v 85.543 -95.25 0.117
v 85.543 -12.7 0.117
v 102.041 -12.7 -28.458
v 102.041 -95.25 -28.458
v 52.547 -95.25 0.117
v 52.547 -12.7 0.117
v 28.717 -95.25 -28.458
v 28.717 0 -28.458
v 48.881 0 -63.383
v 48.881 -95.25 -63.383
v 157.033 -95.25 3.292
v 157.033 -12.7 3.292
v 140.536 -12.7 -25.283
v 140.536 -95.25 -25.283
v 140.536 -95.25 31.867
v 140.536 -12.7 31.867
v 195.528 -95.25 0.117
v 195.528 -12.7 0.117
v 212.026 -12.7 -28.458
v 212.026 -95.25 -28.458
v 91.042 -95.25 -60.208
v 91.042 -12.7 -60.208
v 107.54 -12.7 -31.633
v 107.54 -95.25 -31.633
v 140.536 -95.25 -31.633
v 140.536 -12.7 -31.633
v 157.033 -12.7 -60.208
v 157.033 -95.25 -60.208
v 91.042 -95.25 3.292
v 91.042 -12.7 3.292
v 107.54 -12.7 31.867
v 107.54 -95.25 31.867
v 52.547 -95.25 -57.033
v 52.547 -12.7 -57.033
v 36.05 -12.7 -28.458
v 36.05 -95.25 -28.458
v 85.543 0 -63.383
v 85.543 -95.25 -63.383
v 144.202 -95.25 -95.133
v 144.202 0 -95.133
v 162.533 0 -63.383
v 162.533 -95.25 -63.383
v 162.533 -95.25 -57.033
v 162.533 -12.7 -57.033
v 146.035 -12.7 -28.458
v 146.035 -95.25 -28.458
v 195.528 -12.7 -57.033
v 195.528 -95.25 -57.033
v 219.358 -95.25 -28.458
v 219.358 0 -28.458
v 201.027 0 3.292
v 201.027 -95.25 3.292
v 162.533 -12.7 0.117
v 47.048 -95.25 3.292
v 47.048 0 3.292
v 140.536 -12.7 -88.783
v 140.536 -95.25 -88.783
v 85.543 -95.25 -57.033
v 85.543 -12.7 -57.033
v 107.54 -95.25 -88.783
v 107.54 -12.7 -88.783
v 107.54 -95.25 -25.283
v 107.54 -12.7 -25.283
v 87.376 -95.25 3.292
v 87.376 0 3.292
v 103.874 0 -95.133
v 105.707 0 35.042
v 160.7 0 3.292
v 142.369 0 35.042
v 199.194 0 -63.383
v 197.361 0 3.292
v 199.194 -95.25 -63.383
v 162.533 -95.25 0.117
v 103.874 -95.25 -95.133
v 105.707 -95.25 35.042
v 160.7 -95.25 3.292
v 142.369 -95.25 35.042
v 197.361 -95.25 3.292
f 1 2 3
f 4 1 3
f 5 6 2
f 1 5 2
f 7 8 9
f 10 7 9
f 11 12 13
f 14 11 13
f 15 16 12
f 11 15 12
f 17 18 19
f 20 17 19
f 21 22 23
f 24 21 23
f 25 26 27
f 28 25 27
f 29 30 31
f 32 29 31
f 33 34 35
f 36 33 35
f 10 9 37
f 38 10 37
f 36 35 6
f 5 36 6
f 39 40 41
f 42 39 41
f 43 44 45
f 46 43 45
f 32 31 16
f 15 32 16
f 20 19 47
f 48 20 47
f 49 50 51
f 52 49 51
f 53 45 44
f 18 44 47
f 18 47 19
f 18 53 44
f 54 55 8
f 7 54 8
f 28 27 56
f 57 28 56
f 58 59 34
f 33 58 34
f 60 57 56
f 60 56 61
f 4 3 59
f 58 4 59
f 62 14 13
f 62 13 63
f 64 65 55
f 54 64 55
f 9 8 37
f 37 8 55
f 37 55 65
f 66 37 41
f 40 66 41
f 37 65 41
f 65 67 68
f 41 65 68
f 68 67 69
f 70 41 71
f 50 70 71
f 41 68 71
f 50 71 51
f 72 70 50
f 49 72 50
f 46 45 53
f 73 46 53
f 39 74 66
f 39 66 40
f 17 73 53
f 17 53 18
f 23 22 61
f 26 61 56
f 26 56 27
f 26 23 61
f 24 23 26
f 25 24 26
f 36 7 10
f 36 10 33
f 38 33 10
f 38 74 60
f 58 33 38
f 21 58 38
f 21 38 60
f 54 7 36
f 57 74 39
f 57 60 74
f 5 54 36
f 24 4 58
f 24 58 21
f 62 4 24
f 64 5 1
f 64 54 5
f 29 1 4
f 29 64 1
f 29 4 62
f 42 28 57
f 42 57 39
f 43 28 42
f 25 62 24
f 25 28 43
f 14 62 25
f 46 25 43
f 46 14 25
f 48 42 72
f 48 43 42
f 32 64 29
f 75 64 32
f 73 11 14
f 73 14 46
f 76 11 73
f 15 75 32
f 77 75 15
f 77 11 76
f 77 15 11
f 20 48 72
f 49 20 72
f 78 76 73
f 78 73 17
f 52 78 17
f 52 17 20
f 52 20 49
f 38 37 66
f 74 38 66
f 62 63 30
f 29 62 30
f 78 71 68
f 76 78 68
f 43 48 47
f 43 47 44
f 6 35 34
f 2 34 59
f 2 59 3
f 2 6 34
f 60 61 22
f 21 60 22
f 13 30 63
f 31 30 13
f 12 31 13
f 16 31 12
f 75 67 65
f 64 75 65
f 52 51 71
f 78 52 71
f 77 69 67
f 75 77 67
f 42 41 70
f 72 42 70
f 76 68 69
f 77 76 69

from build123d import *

# Parameters (mm, degrees)
F1_DEPTH = 12.7
F2_DEPTH = 95.25


# Not quite as in the source:
# - a feature names something its author has since deleted; it is built from what else it names


with BuildPart() as f1:
    # F0 (on Front) → F1 (new body)
    with BuildSketch(Plane.XZ):
        Polygon((142.3687008922, 35.0424993012), (105.7069587986, 35.0424993011), (87.3760877519, 3.2924993012), (105.7069587986, -28.4575006988), (142.3687008922, -28.4575006988), (160.6995719389, 3.2924993012), align=None)
        Polygon((107.5400459033, -25.2825006989), (91.0422619612, 3.2924993011), (107.5400459033, 31.8674993011), (140.5356137875, 31.8674993012), (157.0333977296, 3.2924993012), (140.5356137875, -25.2825006988), align=None, mode=Mode.SUBTRACT)
        Polygon((105.7069587986, -28.4575006988), (87.3760877519, 3.2924993012), (50.7143456583, 3.2924993012), (32.3834746115, -28.4575006988), (50.7143456583, -60.2075006988), (87.3760877519, -60.2075006988), align=None)
        Polygon((52.547432763, -57.0325006988), (36.0496488209, -28.4575006988), (52.547432763, 0.1174993012), (85.5430006472, 0.1174993012), (102.0407845893, -28.4575006988), (85.5430006472, -57.0325006988), align=None, mode=Mode.SUBTRACT)
        Polygon((197.3613140325, 3.2924993012), (160.6995719389, 3.2924993012), (142.3687008922, -28.4575006988), (160.6995719389, -60.2075006988), (197.3613140325, -60.2075006988), (215.6921850793, -28.4575006988), align=None)
        Polygon((162.5326590436, -57.0325006988), (146.0348751015, -28.4575006988), (162.5326590436, 0.1174993012), (195.5282269278, 0.1174993012), (212.0260108699, -28.4575006988), (195.5282269278, -57.0325006988), align=None, mode=Mode.SUBTRACT)
        Polygon((142.3687008922, -28.4575006988), (105.7069587986, -28.4575006989), (87.3760877519, -60.2075006988), (105.7069587986, -91.9575006988), (142.3687008922, -91.9575006988), (160.6995719389, -60.2075006988), align=None)
        Polygon((107.5400459033, -88.7825006988), (91.0422619612, -60.2075006988), (107.5400459033, -31.6325006988), (140.5356137875, -31.6325006988), (157.0333977296, -60.2075006988), (140.5356137875, -88.7825006988), align=None, mode=Mode.SUBTRACT)
        Polygon((162.5326590436, 0.1174993012), (146.0348751015, -28.4575006988), (162.5326590436, -57.0325006988), (195.5282269278, -57.0325006988), (212.0260108699, -28.4575006988), (195.5282269278, 0.1174993012), align=None)
        Polygon((52.547432763, 0.1174993012), (36.0496488209, -28.4575006988), (52.547432763, -57.0325006988), (85.5430006472, -57.0325006988), (102.0407845893, -28.4575006988), (85.5430006472, 0.1174993012), align=None)
        Polygon((107.5400459033, 31.8674993011), (91.0422619612, 3.2924993011), (107.5400459033, -25.2825006989), (140.5356137875, -25.2825006988), (157.0333977296, 3.2924993012), (140.5356137875, 31.8674993012), align=None)
        Polygon((107.5400459033, -31.6325006988), (91.0422619612, -60.2075006988), (107.5400459033, -88.7825006988), (140.5356137875, -88.7825006988), (157.0333977296, -60.2075006988), (140.5356137875, -31.6325006988), align=None)
    extrude(amount=F1_DEPTH)

    # F0 (on Front) → F2 (join)
    with BuildSketch(Plane.XZ):
        Polygon((142.3687008922, 35.0424993012), (105.7069587986, 35.0424993011), (87.3760877519, 3.2924993012), (105.7069587986, -28.4575006988), (142.3687008922, -28.4575006988), (160.6995719389, 3.2924993012), align=None)
        Polygon((107.5400459033, -25.2825006989), (91.0422619612, 3.2924993011), (107.5400459033, 31.8674993011), (140.5356137875, 31.8674993012), (157.0333977296, 3.2924993012), (140.5356137875, -25.2825006988), align=None, mode=Mode.SUBTRACT)
        Polygon((197.3613140325, 3.2924993012), (160.6995719389, 3.2924993012), (142.3687008922, -28.4575006988), (160.6995719389, -60.2075006988), (197.3613140325, -60.2075006988), (215.6921850793, -28.4575006988), align=None)
        Polygon((162.5326590436, -57.0325006988), (146.0348751015, -28.4575006988), (162.5326590436, 0.1174993012), (195.5282269278, 0.1174993012), (212.0260108699, -28.4575006988), (195.5282269278, -57.0325006988), align=None, mode=Mode.SUBTRACT)
        Polygon((142.3687008922, -28.4575006988), (105.7069587986, -28.4575006989), (87.3760877519, -60.2075006988), (105.7069587986, -91.9575006988), (142.3687008922, -91.9575006988), (160.6995719389, -60.2075006988), align=None)
        Polygon((107.5400459033, -88.7825006988), (91.0422619612, -60.2075006988), (107.5400459033, -31.6325006988), (140.5356137875, -31.6325006988), (157.0333977296, -60.2075006988), (140.5356137875, -88.7825006988), align=None, mode=Mode.SUBTRACT)
        Polygon((105.7069587986, -28.4575006988), (87.3760877519, 3.2924993012), (50.7143456583, 3.2924993012), (32.3834746115, -28.4575006988), (50.7143456583, -60.2075006988), (87.3760877519, -60.2075006988), align=None)
        Polygon((52.547432763, -57.0325006988), (36.0496488209, -28.4575006988), (52.547432763, 0.1174993012), (85.5430006472, 0.1174993012), (102.0407845893, -28.4575006988), (85.5430006472, -57.0325006988), align=None, mode=Mode.SUBTRACT)
        Polygon((32.3834746115, -28.4575006988), (50.7143456583, 3.2924993012), (47.048171449, 3.2924993012), (28.7173004022, -28.4575006988), (48.8812585536, -63.3825006988), (85.5430006472, -63.3825006988), (103.873871694, -95.1325006988), (144.2017879969, -95.1325006988), (162.5326590436, -63.3825006988), (199.1944011372, -63.3825006988), (219.3583592886, -28.4575006988), (201.0274882418, 3.2924993011), (197.3613140325, 3.2924993012), (215.6921850793, -28.4575006988), (197.3613140325, -60.2075006988), (160.6995719389, -60.2075006988), (142.3687008922, -91.9575006988), (105.7069587986, -91.9575006988), (87.3760877519, -60.2075006988), (50.7143456583, -60.2075006988), align=None)
    extrude(amount=F2_DEPTH)


solid = f1.part
